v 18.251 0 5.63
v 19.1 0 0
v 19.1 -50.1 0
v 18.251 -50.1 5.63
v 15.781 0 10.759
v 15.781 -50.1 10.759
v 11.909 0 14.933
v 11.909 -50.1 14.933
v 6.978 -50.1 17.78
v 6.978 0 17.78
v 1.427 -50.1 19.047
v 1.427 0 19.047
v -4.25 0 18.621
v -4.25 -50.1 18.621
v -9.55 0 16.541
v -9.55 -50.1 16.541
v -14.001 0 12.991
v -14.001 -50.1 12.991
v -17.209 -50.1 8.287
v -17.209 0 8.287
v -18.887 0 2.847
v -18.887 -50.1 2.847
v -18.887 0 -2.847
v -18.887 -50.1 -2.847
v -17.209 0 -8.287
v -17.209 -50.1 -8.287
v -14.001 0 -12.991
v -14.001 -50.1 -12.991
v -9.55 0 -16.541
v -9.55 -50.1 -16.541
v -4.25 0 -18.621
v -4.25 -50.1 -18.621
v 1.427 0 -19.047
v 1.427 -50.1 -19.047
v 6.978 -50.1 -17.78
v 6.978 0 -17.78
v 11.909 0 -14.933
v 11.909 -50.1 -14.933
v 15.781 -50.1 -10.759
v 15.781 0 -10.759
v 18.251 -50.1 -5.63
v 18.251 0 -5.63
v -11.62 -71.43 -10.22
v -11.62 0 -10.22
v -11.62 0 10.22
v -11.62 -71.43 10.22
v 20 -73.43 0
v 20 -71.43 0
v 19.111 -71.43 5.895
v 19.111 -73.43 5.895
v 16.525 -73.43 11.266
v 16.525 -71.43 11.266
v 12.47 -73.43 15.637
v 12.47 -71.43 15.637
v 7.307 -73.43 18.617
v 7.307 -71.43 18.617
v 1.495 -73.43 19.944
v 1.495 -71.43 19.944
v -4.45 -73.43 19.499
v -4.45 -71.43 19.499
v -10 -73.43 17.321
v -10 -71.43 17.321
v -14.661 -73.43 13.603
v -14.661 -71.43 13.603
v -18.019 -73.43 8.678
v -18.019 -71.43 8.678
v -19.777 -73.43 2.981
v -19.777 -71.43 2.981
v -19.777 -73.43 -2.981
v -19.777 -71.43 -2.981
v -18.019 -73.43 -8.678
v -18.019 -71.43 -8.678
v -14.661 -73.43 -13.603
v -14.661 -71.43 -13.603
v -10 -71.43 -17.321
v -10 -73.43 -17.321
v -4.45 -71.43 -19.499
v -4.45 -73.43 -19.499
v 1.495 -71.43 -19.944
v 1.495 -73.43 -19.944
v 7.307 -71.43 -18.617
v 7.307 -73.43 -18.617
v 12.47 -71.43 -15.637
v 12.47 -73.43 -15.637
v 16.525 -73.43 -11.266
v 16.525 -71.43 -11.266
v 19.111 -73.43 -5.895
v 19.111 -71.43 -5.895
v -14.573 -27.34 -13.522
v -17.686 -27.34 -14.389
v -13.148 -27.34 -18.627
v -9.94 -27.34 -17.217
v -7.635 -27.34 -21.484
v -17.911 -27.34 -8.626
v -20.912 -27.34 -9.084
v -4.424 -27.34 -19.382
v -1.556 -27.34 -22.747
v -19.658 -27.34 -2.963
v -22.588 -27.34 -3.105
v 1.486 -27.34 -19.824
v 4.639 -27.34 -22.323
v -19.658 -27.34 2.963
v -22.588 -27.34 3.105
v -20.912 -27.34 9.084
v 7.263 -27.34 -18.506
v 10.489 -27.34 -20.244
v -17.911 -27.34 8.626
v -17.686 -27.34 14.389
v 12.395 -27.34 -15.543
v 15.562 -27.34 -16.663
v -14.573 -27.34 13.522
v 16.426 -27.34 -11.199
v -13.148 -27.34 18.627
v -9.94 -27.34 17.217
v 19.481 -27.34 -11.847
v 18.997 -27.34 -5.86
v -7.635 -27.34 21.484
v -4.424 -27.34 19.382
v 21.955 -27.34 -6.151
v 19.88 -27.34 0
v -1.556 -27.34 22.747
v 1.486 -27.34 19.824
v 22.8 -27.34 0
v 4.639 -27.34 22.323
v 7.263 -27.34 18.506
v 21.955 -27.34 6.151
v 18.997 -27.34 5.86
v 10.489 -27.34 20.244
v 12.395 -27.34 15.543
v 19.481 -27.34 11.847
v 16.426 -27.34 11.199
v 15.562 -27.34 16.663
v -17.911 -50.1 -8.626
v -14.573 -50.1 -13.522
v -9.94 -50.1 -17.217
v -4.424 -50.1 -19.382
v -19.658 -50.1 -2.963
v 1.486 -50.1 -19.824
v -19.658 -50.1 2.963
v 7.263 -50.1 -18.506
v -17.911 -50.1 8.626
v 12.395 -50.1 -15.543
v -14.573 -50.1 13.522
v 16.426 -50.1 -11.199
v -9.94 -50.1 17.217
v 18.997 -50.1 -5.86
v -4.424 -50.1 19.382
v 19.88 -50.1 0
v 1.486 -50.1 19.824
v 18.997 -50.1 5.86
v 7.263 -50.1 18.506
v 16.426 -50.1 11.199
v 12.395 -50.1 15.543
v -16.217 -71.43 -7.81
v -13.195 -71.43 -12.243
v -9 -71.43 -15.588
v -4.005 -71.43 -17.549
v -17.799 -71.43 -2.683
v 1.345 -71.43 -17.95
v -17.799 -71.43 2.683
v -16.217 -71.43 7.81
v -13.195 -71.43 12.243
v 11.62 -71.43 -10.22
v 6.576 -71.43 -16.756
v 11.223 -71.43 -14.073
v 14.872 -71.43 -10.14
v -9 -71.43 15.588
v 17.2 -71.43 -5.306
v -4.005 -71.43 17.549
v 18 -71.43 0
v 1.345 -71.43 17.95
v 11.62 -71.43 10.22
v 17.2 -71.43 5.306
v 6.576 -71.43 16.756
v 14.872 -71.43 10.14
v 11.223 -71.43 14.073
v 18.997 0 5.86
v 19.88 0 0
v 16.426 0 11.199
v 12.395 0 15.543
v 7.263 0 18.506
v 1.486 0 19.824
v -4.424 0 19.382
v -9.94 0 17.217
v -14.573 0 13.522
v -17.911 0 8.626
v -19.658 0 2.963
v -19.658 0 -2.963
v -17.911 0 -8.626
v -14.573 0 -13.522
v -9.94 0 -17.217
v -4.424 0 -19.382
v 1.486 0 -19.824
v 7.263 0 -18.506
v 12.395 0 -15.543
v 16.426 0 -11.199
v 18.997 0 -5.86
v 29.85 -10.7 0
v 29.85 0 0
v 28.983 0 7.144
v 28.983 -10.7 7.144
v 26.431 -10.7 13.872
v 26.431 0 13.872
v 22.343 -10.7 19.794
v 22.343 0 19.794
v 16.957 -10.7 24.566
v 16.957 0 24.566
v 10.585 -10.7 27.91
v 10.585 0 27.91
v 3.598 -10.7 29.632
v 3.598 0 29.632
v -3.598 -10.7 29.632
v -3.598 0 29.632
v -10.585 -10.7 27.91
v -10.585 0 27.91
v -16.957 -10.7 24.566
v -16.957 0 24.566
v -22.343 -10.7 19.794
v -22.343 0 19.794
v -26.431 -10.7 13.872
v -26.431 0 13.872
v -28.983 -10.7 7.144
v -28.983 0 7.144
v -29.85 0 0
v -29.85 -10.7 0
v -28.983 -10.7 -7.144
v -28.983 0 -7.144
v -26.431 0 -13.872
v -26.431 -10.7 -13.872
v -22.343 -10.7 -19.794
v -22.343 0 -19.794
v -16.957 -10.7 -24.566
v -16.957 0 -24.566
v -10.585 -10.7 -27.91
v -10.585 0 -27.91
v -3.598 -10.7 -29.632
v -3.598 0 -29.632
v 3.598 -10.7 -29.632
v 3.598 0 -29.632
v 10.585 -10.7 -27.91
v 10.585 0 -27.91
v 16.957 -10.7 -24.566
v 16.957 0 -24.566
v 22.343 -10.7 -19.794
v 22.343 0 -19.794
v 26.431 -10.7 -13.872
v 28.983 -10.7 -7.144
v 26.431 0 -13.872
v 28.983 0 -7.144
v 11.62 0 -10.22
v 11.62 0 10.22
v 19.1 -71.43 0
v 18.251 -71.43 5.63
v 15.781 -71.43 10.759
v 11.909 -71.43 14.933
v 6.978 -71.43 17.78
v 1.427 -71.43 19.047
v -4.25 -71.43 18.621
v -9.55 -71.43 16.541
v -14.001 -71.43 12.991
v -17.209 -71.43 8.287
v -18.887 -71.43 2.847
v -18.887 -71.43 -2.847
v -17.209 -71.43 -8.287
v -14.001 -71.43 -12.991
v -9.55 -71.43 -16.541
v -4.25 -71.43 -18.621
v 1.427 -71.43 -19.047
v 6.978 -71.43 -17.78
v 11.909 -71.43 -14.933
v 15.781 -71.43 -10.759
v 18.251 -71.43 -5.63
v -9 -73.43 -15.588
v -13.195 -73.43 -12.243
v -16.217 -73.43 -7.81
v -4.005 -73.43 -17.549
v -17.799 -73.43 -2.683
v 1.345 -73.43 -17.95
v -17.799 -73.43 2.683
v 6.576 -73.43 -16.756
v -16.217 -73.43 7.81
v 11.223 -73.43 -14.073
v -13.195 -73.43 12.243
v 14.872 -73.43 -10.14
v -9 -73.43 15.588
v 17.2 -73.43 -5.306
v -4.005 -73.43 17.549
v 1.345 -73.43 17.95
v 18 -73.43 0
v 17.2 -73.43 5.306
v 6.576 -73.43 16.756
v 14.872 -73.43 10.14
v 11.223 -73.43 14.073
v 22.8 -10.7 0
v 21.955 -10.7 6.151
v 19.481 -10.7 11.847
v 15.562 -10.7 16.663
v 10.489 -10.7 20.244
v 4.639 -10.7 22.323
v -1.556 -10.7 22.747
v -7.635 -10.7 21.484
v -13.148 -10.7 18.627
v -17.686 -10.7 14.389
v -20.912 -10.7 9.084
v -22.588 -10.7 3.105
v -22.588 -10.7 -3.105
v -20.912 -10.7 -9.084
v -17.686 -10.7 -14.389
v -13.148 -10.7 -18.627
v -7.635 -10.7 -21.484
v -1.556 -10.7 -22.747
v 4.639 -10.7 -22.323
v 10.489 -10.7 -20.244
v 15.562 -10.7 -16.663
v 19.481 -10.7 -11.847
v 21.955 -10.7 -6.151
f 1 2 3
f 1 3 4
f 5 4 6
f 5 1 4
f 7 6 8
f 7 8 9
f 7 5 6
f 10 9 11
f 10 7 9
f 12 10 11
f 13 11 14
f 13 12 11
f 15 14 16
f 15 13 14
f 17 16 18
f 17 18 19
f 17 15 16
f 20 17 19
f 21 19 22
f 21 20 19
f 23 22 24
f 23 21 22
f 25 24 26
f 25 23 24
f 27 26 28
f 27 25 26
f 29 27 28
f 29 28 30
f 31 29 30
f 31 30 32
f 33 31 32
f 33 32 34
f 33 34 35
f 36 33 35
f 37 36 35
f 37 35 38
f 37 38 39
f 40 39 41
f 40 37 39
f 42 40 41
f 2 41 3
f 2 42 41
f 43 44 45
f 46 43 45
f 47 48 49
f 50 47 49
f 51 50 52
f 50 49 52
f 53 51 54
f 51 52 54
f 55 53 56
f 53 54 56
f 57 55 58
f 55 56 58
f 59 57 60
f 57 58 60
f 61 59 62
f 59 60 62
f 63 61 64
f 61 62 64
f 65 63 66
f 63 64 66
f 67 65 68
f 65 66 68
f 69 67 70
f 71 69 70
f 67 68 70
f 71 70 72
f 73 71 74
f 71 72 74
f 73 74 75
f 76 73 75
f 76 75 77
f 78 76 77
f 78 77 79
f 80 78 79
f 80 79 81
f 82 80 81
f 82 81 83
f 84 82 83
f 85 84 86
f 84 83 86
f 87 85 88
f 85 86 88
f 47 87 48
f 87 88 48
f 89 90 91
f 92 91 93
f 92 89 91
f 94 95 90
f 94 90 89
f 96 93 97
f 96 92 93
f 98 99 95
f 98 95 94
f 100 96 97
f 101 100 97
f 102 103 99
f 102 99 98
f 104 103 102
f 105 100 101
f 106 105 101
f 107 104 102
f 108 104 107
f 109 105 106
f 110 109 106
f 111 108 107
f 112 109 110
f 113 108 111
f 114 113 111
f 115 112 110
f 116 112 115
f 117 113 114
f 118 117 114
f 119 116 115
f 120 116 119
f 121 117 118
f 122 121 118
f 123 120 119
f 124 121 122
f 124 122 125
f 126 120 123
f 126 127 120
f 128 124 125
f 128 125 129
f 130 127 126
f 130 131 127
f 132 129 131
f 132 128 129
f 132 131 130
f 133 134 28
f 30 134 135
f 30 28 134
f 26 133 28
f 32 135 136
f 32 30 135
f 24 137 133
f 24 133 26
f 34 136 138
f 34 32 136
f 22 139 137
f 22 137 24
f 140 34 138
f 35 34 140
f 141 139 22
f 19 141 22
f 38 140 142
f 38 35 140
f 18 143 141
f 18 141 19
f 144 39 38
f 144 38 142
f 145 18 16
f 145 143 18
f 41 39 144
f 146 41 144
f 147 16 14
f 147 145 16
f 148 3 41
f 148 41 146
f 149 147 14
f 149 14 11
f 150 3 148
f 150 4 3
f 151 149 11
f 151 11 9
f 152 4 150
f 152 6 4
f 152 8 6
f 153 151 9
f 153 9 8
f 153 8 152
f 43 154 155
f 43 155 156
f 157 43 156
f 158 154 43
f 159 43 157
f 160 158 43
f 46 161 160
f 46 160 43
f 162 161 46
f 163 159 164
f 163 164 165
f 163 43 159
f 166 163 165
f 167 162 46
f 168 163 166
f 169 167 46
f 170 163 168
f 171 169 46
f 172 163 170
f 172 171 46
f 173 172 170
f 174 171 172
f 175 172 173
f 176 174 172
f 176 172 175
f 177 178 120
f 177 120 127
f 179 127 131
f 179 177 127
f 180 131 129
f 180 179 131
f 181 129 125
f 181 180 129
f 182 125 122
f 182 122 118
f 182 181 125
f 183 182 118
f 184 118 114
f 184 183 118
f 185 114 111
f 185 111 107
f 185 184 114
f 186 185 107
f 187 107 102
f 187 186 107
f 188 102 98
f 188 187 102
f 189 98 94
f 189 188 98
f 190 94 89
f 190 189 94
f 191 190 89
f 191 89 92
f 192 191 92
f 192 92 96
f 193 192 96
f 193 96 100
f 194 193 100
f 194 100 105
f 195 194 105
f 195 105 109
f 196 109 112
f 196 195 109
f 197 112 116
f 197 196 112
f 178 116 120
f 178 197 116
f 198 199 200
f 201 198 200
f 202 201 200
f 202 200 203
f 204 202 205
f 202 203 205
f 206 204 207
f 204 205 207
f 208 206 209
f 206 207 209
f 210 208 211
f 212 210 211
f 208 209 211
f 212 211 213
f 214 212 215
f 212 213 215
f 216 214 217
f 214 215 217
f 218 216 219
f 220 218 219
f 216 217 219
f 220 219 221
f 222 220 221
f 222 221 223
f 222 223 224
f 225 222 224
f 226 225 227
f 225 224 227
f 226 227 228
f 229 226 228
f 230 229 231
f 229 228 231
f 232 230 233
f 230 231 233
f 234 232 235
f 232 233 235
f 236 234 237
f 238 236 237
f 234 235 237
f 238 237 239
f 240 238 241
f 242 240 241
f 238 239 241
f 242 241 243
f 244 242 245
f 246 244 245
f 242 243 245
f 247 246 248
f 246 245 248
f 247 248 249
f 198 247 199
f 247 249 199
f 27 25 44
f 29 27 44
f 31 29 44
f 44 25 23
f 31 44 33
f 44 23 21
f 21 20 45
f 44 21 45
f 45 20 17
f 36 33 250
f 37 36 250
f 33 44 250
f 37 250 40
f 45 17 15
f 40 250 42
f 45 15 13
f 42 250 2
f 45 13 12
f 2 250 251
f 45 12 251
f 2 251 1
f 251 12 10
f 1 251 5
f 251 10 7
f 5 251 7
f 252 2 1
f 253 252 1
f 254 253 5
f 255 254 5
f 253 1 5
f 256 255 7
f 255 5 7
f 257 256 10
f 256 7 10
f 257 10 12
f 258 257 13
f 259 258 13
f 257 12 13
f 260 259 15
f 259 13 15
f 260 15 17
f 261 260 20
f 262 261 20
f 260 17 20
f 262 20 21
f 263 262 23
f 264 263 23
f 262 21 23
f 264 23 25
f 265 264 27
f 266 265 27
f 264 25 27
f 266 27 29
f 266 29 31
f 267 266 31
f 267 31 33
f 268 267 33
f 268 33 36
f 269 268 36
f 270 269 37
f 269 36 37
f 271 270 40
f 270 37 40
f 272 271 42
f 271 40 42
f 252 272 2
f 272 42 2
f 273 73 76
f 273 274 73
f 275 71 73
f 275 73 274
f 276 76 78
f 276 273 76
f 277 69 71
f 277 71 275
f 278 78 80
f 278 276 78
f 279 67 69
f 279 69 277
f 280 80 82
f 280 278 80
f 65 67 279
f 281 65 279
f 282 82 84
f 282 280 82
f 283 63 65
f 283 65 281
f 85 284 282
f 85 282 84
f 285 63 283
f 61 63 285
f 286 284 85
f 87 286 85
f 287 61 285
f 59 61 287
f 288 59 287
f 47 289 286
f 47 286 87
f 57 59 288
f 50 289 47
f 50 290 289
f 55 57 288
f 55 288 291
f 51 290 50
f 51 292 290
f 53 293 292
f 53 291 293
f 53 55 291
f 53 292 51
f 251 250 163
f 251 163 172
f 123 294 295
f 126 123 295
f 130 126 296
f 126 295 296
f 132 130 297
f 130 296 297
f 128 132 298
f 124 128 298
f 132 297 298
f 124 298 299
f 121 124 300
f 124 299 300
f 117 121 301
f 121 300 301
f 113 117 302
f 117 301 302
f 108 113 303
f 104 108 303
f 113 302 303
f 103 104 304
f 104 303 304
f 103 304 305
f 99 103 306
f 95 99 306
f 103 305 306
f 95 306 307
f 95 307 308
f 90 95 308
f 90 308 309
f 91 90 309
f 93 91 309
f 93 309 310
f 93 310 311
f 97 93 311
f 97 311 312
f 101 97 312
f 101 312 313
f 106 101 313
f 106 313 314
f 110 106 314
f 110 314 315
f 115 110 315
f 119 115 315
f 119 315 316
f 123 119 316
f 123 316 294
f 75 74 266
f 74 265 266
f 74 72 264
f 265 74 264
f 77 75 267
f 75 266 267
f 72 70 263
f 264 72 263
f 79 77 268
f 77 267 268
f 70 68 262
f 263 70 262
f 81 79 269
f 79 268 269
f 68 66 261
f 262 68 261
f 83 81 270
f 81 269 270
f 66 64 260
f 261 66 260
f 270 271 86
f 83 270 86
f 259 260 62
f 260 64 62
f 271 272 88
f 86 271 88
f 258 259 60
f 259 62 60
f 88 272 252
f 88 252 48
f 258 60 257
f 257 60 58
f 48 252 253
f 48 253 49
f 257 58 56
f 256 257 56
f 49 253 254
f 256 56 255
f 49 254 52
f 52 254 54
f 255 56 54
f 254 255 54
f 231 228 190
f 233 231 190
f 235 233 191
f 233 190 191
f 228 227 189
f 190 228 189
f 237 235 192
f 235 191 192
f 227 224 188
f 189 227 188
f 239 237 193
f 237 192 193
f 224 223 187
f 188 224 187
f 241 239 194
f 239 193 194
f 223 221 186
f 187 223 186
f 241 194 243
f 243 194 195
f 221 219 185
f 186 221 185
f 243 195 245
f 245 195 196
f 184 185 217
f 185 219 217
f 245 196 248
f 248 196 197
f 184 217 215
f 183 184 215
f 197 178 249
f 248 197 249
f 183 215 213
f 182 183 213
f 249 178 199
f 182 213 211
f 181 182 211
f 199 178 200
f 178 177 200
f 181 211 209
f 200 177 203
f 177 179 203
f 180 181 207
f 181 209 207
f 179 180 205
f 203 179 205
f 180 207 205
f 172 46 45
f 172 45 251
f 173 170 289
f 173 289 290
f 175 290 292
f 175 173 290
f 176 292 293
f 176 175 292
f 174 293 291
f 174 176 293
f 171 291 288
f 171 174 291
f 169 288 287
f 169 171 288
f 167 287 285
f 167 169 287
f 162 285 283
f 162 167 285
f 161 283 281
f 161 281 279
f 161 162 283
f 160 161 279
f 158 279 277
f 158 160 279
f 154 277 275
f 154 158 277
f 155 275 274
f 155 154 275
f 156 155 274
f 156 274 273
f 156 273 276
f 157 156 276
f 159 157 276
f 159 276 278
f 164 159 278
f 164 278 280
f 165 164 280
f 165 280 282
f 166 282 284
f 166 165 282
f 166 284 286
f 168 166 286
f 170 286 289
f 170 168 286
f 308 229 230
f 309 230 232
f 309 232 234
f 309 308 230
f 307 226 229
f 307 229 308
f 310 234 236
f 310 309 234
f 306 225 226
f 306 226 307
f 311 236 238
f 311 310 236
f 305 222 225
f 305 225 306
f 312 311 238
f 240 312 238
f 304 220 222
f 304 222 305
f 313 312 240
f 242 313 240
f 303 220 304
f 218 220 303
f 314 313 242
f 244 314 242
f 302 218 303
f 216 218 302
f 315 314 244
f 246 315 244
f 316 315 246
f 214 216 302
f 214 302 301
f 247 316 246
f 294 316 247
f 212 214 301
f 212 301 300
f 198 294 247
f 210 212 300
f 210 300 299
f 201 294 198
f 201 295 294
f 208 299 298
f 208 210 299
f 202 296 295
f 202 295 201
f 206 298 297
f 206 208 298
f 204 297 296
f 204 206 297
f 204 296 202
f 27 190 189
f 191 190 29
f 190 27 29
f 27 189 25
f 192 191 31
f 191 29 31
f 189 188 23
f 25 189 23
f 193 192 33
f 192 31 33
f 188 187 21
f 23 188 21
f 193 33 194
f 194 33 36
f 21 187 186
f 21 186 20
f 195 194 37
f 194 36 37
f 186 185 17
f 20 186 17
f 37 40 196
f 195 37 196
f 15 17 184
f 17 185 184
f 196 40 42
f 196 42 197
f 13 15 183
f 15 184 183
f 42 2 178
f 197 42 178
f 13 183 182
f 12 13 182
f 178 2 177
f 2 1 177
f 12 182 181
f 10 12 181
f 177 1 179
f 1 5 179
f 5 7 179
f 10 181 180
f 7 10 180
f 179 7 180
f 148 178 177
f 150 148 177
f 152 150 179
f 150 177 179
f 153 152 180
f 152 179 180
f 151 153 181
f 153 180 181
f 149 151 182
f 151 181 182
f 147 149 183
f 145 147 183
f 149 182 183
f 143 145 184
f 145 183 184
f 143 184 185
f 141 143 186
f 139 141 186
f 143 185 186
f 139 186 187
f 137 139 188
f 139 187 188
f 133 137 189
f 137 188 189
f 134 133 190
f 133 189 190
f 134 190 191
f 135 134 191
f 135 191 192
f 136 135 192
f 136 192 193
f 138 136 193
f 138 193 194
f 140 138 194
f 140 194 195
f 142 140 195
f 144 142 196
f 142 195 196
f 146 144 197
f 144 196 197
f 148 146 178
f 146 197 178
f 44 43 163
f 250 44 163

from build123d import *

# Parameters (mm, degrees)
F0_R     = 29.85
F0_R_2   = 22.8
F2_DEPTH = 10.7
F0_R_3   = 19.88
F3_DEPTH = 27.34
F0_R_4   = 19.1
F4_DEPTH = 50.1
F5_DEPTH = 71.43
F1_W     = 23.24
F1_H     = 20.44
F6_DEPTH = 72
F7_R     = 20
F7_R_2   = 18
F8_DEPTH = 2


with BuildPart() as f2:
    # F0 (on Front) → F2 (new body)
    with BuildSketch(Plane.XZ):
        Circle(F0_R)
        Circle(F0_R_2, mode=Mode.SUBTRACT)
    extrude(amount=F2_DEPTH)

    # F0 (on Front) → F3 (join)
    with BuildSketch(Plane.XZ):
        Circle(F0_R_2)
        Circle(F0_R_3, mode=Mode.SUBTRACT)
    extrude(amount=F3_DEPTH)


with BuildPart() as f4:
    # F0 (on Front) → F4 (new body)
    with BuildSketch(Plane.XZ):
        Circle(F0_R_3)
        Circle(F0_R_4, mode=Mode.SUBTRACT)
    extrude(amount=F4_DEPTH)


with BuildPart() as f5:
    # F0 (on Front) → F5 (new body)
    with BuildSketch(Plane.XZ):
        Circle(F0_R_4)
    extrude(amount=F5_DEPTH)

    # F1 (on Front) → F6 (cut)
    with BuildSketch(Plane.XZ):
        Rectangle(F1_W, F1_H)
    extrude(amount=F6_DEPTH, mode=Mode.SUBTRACT)

    # F7 (on face) → F8 (join)
    with BuildSketch(Plane.XZ.offset(71.43)):
        Circle(F7_R)
        Circle(F7_R_2, mode=Mode.SUBTRACT)
    extrude(amount=F8_DEPTH)


solid = Compound([f2.part, f4.part, f5.part])
